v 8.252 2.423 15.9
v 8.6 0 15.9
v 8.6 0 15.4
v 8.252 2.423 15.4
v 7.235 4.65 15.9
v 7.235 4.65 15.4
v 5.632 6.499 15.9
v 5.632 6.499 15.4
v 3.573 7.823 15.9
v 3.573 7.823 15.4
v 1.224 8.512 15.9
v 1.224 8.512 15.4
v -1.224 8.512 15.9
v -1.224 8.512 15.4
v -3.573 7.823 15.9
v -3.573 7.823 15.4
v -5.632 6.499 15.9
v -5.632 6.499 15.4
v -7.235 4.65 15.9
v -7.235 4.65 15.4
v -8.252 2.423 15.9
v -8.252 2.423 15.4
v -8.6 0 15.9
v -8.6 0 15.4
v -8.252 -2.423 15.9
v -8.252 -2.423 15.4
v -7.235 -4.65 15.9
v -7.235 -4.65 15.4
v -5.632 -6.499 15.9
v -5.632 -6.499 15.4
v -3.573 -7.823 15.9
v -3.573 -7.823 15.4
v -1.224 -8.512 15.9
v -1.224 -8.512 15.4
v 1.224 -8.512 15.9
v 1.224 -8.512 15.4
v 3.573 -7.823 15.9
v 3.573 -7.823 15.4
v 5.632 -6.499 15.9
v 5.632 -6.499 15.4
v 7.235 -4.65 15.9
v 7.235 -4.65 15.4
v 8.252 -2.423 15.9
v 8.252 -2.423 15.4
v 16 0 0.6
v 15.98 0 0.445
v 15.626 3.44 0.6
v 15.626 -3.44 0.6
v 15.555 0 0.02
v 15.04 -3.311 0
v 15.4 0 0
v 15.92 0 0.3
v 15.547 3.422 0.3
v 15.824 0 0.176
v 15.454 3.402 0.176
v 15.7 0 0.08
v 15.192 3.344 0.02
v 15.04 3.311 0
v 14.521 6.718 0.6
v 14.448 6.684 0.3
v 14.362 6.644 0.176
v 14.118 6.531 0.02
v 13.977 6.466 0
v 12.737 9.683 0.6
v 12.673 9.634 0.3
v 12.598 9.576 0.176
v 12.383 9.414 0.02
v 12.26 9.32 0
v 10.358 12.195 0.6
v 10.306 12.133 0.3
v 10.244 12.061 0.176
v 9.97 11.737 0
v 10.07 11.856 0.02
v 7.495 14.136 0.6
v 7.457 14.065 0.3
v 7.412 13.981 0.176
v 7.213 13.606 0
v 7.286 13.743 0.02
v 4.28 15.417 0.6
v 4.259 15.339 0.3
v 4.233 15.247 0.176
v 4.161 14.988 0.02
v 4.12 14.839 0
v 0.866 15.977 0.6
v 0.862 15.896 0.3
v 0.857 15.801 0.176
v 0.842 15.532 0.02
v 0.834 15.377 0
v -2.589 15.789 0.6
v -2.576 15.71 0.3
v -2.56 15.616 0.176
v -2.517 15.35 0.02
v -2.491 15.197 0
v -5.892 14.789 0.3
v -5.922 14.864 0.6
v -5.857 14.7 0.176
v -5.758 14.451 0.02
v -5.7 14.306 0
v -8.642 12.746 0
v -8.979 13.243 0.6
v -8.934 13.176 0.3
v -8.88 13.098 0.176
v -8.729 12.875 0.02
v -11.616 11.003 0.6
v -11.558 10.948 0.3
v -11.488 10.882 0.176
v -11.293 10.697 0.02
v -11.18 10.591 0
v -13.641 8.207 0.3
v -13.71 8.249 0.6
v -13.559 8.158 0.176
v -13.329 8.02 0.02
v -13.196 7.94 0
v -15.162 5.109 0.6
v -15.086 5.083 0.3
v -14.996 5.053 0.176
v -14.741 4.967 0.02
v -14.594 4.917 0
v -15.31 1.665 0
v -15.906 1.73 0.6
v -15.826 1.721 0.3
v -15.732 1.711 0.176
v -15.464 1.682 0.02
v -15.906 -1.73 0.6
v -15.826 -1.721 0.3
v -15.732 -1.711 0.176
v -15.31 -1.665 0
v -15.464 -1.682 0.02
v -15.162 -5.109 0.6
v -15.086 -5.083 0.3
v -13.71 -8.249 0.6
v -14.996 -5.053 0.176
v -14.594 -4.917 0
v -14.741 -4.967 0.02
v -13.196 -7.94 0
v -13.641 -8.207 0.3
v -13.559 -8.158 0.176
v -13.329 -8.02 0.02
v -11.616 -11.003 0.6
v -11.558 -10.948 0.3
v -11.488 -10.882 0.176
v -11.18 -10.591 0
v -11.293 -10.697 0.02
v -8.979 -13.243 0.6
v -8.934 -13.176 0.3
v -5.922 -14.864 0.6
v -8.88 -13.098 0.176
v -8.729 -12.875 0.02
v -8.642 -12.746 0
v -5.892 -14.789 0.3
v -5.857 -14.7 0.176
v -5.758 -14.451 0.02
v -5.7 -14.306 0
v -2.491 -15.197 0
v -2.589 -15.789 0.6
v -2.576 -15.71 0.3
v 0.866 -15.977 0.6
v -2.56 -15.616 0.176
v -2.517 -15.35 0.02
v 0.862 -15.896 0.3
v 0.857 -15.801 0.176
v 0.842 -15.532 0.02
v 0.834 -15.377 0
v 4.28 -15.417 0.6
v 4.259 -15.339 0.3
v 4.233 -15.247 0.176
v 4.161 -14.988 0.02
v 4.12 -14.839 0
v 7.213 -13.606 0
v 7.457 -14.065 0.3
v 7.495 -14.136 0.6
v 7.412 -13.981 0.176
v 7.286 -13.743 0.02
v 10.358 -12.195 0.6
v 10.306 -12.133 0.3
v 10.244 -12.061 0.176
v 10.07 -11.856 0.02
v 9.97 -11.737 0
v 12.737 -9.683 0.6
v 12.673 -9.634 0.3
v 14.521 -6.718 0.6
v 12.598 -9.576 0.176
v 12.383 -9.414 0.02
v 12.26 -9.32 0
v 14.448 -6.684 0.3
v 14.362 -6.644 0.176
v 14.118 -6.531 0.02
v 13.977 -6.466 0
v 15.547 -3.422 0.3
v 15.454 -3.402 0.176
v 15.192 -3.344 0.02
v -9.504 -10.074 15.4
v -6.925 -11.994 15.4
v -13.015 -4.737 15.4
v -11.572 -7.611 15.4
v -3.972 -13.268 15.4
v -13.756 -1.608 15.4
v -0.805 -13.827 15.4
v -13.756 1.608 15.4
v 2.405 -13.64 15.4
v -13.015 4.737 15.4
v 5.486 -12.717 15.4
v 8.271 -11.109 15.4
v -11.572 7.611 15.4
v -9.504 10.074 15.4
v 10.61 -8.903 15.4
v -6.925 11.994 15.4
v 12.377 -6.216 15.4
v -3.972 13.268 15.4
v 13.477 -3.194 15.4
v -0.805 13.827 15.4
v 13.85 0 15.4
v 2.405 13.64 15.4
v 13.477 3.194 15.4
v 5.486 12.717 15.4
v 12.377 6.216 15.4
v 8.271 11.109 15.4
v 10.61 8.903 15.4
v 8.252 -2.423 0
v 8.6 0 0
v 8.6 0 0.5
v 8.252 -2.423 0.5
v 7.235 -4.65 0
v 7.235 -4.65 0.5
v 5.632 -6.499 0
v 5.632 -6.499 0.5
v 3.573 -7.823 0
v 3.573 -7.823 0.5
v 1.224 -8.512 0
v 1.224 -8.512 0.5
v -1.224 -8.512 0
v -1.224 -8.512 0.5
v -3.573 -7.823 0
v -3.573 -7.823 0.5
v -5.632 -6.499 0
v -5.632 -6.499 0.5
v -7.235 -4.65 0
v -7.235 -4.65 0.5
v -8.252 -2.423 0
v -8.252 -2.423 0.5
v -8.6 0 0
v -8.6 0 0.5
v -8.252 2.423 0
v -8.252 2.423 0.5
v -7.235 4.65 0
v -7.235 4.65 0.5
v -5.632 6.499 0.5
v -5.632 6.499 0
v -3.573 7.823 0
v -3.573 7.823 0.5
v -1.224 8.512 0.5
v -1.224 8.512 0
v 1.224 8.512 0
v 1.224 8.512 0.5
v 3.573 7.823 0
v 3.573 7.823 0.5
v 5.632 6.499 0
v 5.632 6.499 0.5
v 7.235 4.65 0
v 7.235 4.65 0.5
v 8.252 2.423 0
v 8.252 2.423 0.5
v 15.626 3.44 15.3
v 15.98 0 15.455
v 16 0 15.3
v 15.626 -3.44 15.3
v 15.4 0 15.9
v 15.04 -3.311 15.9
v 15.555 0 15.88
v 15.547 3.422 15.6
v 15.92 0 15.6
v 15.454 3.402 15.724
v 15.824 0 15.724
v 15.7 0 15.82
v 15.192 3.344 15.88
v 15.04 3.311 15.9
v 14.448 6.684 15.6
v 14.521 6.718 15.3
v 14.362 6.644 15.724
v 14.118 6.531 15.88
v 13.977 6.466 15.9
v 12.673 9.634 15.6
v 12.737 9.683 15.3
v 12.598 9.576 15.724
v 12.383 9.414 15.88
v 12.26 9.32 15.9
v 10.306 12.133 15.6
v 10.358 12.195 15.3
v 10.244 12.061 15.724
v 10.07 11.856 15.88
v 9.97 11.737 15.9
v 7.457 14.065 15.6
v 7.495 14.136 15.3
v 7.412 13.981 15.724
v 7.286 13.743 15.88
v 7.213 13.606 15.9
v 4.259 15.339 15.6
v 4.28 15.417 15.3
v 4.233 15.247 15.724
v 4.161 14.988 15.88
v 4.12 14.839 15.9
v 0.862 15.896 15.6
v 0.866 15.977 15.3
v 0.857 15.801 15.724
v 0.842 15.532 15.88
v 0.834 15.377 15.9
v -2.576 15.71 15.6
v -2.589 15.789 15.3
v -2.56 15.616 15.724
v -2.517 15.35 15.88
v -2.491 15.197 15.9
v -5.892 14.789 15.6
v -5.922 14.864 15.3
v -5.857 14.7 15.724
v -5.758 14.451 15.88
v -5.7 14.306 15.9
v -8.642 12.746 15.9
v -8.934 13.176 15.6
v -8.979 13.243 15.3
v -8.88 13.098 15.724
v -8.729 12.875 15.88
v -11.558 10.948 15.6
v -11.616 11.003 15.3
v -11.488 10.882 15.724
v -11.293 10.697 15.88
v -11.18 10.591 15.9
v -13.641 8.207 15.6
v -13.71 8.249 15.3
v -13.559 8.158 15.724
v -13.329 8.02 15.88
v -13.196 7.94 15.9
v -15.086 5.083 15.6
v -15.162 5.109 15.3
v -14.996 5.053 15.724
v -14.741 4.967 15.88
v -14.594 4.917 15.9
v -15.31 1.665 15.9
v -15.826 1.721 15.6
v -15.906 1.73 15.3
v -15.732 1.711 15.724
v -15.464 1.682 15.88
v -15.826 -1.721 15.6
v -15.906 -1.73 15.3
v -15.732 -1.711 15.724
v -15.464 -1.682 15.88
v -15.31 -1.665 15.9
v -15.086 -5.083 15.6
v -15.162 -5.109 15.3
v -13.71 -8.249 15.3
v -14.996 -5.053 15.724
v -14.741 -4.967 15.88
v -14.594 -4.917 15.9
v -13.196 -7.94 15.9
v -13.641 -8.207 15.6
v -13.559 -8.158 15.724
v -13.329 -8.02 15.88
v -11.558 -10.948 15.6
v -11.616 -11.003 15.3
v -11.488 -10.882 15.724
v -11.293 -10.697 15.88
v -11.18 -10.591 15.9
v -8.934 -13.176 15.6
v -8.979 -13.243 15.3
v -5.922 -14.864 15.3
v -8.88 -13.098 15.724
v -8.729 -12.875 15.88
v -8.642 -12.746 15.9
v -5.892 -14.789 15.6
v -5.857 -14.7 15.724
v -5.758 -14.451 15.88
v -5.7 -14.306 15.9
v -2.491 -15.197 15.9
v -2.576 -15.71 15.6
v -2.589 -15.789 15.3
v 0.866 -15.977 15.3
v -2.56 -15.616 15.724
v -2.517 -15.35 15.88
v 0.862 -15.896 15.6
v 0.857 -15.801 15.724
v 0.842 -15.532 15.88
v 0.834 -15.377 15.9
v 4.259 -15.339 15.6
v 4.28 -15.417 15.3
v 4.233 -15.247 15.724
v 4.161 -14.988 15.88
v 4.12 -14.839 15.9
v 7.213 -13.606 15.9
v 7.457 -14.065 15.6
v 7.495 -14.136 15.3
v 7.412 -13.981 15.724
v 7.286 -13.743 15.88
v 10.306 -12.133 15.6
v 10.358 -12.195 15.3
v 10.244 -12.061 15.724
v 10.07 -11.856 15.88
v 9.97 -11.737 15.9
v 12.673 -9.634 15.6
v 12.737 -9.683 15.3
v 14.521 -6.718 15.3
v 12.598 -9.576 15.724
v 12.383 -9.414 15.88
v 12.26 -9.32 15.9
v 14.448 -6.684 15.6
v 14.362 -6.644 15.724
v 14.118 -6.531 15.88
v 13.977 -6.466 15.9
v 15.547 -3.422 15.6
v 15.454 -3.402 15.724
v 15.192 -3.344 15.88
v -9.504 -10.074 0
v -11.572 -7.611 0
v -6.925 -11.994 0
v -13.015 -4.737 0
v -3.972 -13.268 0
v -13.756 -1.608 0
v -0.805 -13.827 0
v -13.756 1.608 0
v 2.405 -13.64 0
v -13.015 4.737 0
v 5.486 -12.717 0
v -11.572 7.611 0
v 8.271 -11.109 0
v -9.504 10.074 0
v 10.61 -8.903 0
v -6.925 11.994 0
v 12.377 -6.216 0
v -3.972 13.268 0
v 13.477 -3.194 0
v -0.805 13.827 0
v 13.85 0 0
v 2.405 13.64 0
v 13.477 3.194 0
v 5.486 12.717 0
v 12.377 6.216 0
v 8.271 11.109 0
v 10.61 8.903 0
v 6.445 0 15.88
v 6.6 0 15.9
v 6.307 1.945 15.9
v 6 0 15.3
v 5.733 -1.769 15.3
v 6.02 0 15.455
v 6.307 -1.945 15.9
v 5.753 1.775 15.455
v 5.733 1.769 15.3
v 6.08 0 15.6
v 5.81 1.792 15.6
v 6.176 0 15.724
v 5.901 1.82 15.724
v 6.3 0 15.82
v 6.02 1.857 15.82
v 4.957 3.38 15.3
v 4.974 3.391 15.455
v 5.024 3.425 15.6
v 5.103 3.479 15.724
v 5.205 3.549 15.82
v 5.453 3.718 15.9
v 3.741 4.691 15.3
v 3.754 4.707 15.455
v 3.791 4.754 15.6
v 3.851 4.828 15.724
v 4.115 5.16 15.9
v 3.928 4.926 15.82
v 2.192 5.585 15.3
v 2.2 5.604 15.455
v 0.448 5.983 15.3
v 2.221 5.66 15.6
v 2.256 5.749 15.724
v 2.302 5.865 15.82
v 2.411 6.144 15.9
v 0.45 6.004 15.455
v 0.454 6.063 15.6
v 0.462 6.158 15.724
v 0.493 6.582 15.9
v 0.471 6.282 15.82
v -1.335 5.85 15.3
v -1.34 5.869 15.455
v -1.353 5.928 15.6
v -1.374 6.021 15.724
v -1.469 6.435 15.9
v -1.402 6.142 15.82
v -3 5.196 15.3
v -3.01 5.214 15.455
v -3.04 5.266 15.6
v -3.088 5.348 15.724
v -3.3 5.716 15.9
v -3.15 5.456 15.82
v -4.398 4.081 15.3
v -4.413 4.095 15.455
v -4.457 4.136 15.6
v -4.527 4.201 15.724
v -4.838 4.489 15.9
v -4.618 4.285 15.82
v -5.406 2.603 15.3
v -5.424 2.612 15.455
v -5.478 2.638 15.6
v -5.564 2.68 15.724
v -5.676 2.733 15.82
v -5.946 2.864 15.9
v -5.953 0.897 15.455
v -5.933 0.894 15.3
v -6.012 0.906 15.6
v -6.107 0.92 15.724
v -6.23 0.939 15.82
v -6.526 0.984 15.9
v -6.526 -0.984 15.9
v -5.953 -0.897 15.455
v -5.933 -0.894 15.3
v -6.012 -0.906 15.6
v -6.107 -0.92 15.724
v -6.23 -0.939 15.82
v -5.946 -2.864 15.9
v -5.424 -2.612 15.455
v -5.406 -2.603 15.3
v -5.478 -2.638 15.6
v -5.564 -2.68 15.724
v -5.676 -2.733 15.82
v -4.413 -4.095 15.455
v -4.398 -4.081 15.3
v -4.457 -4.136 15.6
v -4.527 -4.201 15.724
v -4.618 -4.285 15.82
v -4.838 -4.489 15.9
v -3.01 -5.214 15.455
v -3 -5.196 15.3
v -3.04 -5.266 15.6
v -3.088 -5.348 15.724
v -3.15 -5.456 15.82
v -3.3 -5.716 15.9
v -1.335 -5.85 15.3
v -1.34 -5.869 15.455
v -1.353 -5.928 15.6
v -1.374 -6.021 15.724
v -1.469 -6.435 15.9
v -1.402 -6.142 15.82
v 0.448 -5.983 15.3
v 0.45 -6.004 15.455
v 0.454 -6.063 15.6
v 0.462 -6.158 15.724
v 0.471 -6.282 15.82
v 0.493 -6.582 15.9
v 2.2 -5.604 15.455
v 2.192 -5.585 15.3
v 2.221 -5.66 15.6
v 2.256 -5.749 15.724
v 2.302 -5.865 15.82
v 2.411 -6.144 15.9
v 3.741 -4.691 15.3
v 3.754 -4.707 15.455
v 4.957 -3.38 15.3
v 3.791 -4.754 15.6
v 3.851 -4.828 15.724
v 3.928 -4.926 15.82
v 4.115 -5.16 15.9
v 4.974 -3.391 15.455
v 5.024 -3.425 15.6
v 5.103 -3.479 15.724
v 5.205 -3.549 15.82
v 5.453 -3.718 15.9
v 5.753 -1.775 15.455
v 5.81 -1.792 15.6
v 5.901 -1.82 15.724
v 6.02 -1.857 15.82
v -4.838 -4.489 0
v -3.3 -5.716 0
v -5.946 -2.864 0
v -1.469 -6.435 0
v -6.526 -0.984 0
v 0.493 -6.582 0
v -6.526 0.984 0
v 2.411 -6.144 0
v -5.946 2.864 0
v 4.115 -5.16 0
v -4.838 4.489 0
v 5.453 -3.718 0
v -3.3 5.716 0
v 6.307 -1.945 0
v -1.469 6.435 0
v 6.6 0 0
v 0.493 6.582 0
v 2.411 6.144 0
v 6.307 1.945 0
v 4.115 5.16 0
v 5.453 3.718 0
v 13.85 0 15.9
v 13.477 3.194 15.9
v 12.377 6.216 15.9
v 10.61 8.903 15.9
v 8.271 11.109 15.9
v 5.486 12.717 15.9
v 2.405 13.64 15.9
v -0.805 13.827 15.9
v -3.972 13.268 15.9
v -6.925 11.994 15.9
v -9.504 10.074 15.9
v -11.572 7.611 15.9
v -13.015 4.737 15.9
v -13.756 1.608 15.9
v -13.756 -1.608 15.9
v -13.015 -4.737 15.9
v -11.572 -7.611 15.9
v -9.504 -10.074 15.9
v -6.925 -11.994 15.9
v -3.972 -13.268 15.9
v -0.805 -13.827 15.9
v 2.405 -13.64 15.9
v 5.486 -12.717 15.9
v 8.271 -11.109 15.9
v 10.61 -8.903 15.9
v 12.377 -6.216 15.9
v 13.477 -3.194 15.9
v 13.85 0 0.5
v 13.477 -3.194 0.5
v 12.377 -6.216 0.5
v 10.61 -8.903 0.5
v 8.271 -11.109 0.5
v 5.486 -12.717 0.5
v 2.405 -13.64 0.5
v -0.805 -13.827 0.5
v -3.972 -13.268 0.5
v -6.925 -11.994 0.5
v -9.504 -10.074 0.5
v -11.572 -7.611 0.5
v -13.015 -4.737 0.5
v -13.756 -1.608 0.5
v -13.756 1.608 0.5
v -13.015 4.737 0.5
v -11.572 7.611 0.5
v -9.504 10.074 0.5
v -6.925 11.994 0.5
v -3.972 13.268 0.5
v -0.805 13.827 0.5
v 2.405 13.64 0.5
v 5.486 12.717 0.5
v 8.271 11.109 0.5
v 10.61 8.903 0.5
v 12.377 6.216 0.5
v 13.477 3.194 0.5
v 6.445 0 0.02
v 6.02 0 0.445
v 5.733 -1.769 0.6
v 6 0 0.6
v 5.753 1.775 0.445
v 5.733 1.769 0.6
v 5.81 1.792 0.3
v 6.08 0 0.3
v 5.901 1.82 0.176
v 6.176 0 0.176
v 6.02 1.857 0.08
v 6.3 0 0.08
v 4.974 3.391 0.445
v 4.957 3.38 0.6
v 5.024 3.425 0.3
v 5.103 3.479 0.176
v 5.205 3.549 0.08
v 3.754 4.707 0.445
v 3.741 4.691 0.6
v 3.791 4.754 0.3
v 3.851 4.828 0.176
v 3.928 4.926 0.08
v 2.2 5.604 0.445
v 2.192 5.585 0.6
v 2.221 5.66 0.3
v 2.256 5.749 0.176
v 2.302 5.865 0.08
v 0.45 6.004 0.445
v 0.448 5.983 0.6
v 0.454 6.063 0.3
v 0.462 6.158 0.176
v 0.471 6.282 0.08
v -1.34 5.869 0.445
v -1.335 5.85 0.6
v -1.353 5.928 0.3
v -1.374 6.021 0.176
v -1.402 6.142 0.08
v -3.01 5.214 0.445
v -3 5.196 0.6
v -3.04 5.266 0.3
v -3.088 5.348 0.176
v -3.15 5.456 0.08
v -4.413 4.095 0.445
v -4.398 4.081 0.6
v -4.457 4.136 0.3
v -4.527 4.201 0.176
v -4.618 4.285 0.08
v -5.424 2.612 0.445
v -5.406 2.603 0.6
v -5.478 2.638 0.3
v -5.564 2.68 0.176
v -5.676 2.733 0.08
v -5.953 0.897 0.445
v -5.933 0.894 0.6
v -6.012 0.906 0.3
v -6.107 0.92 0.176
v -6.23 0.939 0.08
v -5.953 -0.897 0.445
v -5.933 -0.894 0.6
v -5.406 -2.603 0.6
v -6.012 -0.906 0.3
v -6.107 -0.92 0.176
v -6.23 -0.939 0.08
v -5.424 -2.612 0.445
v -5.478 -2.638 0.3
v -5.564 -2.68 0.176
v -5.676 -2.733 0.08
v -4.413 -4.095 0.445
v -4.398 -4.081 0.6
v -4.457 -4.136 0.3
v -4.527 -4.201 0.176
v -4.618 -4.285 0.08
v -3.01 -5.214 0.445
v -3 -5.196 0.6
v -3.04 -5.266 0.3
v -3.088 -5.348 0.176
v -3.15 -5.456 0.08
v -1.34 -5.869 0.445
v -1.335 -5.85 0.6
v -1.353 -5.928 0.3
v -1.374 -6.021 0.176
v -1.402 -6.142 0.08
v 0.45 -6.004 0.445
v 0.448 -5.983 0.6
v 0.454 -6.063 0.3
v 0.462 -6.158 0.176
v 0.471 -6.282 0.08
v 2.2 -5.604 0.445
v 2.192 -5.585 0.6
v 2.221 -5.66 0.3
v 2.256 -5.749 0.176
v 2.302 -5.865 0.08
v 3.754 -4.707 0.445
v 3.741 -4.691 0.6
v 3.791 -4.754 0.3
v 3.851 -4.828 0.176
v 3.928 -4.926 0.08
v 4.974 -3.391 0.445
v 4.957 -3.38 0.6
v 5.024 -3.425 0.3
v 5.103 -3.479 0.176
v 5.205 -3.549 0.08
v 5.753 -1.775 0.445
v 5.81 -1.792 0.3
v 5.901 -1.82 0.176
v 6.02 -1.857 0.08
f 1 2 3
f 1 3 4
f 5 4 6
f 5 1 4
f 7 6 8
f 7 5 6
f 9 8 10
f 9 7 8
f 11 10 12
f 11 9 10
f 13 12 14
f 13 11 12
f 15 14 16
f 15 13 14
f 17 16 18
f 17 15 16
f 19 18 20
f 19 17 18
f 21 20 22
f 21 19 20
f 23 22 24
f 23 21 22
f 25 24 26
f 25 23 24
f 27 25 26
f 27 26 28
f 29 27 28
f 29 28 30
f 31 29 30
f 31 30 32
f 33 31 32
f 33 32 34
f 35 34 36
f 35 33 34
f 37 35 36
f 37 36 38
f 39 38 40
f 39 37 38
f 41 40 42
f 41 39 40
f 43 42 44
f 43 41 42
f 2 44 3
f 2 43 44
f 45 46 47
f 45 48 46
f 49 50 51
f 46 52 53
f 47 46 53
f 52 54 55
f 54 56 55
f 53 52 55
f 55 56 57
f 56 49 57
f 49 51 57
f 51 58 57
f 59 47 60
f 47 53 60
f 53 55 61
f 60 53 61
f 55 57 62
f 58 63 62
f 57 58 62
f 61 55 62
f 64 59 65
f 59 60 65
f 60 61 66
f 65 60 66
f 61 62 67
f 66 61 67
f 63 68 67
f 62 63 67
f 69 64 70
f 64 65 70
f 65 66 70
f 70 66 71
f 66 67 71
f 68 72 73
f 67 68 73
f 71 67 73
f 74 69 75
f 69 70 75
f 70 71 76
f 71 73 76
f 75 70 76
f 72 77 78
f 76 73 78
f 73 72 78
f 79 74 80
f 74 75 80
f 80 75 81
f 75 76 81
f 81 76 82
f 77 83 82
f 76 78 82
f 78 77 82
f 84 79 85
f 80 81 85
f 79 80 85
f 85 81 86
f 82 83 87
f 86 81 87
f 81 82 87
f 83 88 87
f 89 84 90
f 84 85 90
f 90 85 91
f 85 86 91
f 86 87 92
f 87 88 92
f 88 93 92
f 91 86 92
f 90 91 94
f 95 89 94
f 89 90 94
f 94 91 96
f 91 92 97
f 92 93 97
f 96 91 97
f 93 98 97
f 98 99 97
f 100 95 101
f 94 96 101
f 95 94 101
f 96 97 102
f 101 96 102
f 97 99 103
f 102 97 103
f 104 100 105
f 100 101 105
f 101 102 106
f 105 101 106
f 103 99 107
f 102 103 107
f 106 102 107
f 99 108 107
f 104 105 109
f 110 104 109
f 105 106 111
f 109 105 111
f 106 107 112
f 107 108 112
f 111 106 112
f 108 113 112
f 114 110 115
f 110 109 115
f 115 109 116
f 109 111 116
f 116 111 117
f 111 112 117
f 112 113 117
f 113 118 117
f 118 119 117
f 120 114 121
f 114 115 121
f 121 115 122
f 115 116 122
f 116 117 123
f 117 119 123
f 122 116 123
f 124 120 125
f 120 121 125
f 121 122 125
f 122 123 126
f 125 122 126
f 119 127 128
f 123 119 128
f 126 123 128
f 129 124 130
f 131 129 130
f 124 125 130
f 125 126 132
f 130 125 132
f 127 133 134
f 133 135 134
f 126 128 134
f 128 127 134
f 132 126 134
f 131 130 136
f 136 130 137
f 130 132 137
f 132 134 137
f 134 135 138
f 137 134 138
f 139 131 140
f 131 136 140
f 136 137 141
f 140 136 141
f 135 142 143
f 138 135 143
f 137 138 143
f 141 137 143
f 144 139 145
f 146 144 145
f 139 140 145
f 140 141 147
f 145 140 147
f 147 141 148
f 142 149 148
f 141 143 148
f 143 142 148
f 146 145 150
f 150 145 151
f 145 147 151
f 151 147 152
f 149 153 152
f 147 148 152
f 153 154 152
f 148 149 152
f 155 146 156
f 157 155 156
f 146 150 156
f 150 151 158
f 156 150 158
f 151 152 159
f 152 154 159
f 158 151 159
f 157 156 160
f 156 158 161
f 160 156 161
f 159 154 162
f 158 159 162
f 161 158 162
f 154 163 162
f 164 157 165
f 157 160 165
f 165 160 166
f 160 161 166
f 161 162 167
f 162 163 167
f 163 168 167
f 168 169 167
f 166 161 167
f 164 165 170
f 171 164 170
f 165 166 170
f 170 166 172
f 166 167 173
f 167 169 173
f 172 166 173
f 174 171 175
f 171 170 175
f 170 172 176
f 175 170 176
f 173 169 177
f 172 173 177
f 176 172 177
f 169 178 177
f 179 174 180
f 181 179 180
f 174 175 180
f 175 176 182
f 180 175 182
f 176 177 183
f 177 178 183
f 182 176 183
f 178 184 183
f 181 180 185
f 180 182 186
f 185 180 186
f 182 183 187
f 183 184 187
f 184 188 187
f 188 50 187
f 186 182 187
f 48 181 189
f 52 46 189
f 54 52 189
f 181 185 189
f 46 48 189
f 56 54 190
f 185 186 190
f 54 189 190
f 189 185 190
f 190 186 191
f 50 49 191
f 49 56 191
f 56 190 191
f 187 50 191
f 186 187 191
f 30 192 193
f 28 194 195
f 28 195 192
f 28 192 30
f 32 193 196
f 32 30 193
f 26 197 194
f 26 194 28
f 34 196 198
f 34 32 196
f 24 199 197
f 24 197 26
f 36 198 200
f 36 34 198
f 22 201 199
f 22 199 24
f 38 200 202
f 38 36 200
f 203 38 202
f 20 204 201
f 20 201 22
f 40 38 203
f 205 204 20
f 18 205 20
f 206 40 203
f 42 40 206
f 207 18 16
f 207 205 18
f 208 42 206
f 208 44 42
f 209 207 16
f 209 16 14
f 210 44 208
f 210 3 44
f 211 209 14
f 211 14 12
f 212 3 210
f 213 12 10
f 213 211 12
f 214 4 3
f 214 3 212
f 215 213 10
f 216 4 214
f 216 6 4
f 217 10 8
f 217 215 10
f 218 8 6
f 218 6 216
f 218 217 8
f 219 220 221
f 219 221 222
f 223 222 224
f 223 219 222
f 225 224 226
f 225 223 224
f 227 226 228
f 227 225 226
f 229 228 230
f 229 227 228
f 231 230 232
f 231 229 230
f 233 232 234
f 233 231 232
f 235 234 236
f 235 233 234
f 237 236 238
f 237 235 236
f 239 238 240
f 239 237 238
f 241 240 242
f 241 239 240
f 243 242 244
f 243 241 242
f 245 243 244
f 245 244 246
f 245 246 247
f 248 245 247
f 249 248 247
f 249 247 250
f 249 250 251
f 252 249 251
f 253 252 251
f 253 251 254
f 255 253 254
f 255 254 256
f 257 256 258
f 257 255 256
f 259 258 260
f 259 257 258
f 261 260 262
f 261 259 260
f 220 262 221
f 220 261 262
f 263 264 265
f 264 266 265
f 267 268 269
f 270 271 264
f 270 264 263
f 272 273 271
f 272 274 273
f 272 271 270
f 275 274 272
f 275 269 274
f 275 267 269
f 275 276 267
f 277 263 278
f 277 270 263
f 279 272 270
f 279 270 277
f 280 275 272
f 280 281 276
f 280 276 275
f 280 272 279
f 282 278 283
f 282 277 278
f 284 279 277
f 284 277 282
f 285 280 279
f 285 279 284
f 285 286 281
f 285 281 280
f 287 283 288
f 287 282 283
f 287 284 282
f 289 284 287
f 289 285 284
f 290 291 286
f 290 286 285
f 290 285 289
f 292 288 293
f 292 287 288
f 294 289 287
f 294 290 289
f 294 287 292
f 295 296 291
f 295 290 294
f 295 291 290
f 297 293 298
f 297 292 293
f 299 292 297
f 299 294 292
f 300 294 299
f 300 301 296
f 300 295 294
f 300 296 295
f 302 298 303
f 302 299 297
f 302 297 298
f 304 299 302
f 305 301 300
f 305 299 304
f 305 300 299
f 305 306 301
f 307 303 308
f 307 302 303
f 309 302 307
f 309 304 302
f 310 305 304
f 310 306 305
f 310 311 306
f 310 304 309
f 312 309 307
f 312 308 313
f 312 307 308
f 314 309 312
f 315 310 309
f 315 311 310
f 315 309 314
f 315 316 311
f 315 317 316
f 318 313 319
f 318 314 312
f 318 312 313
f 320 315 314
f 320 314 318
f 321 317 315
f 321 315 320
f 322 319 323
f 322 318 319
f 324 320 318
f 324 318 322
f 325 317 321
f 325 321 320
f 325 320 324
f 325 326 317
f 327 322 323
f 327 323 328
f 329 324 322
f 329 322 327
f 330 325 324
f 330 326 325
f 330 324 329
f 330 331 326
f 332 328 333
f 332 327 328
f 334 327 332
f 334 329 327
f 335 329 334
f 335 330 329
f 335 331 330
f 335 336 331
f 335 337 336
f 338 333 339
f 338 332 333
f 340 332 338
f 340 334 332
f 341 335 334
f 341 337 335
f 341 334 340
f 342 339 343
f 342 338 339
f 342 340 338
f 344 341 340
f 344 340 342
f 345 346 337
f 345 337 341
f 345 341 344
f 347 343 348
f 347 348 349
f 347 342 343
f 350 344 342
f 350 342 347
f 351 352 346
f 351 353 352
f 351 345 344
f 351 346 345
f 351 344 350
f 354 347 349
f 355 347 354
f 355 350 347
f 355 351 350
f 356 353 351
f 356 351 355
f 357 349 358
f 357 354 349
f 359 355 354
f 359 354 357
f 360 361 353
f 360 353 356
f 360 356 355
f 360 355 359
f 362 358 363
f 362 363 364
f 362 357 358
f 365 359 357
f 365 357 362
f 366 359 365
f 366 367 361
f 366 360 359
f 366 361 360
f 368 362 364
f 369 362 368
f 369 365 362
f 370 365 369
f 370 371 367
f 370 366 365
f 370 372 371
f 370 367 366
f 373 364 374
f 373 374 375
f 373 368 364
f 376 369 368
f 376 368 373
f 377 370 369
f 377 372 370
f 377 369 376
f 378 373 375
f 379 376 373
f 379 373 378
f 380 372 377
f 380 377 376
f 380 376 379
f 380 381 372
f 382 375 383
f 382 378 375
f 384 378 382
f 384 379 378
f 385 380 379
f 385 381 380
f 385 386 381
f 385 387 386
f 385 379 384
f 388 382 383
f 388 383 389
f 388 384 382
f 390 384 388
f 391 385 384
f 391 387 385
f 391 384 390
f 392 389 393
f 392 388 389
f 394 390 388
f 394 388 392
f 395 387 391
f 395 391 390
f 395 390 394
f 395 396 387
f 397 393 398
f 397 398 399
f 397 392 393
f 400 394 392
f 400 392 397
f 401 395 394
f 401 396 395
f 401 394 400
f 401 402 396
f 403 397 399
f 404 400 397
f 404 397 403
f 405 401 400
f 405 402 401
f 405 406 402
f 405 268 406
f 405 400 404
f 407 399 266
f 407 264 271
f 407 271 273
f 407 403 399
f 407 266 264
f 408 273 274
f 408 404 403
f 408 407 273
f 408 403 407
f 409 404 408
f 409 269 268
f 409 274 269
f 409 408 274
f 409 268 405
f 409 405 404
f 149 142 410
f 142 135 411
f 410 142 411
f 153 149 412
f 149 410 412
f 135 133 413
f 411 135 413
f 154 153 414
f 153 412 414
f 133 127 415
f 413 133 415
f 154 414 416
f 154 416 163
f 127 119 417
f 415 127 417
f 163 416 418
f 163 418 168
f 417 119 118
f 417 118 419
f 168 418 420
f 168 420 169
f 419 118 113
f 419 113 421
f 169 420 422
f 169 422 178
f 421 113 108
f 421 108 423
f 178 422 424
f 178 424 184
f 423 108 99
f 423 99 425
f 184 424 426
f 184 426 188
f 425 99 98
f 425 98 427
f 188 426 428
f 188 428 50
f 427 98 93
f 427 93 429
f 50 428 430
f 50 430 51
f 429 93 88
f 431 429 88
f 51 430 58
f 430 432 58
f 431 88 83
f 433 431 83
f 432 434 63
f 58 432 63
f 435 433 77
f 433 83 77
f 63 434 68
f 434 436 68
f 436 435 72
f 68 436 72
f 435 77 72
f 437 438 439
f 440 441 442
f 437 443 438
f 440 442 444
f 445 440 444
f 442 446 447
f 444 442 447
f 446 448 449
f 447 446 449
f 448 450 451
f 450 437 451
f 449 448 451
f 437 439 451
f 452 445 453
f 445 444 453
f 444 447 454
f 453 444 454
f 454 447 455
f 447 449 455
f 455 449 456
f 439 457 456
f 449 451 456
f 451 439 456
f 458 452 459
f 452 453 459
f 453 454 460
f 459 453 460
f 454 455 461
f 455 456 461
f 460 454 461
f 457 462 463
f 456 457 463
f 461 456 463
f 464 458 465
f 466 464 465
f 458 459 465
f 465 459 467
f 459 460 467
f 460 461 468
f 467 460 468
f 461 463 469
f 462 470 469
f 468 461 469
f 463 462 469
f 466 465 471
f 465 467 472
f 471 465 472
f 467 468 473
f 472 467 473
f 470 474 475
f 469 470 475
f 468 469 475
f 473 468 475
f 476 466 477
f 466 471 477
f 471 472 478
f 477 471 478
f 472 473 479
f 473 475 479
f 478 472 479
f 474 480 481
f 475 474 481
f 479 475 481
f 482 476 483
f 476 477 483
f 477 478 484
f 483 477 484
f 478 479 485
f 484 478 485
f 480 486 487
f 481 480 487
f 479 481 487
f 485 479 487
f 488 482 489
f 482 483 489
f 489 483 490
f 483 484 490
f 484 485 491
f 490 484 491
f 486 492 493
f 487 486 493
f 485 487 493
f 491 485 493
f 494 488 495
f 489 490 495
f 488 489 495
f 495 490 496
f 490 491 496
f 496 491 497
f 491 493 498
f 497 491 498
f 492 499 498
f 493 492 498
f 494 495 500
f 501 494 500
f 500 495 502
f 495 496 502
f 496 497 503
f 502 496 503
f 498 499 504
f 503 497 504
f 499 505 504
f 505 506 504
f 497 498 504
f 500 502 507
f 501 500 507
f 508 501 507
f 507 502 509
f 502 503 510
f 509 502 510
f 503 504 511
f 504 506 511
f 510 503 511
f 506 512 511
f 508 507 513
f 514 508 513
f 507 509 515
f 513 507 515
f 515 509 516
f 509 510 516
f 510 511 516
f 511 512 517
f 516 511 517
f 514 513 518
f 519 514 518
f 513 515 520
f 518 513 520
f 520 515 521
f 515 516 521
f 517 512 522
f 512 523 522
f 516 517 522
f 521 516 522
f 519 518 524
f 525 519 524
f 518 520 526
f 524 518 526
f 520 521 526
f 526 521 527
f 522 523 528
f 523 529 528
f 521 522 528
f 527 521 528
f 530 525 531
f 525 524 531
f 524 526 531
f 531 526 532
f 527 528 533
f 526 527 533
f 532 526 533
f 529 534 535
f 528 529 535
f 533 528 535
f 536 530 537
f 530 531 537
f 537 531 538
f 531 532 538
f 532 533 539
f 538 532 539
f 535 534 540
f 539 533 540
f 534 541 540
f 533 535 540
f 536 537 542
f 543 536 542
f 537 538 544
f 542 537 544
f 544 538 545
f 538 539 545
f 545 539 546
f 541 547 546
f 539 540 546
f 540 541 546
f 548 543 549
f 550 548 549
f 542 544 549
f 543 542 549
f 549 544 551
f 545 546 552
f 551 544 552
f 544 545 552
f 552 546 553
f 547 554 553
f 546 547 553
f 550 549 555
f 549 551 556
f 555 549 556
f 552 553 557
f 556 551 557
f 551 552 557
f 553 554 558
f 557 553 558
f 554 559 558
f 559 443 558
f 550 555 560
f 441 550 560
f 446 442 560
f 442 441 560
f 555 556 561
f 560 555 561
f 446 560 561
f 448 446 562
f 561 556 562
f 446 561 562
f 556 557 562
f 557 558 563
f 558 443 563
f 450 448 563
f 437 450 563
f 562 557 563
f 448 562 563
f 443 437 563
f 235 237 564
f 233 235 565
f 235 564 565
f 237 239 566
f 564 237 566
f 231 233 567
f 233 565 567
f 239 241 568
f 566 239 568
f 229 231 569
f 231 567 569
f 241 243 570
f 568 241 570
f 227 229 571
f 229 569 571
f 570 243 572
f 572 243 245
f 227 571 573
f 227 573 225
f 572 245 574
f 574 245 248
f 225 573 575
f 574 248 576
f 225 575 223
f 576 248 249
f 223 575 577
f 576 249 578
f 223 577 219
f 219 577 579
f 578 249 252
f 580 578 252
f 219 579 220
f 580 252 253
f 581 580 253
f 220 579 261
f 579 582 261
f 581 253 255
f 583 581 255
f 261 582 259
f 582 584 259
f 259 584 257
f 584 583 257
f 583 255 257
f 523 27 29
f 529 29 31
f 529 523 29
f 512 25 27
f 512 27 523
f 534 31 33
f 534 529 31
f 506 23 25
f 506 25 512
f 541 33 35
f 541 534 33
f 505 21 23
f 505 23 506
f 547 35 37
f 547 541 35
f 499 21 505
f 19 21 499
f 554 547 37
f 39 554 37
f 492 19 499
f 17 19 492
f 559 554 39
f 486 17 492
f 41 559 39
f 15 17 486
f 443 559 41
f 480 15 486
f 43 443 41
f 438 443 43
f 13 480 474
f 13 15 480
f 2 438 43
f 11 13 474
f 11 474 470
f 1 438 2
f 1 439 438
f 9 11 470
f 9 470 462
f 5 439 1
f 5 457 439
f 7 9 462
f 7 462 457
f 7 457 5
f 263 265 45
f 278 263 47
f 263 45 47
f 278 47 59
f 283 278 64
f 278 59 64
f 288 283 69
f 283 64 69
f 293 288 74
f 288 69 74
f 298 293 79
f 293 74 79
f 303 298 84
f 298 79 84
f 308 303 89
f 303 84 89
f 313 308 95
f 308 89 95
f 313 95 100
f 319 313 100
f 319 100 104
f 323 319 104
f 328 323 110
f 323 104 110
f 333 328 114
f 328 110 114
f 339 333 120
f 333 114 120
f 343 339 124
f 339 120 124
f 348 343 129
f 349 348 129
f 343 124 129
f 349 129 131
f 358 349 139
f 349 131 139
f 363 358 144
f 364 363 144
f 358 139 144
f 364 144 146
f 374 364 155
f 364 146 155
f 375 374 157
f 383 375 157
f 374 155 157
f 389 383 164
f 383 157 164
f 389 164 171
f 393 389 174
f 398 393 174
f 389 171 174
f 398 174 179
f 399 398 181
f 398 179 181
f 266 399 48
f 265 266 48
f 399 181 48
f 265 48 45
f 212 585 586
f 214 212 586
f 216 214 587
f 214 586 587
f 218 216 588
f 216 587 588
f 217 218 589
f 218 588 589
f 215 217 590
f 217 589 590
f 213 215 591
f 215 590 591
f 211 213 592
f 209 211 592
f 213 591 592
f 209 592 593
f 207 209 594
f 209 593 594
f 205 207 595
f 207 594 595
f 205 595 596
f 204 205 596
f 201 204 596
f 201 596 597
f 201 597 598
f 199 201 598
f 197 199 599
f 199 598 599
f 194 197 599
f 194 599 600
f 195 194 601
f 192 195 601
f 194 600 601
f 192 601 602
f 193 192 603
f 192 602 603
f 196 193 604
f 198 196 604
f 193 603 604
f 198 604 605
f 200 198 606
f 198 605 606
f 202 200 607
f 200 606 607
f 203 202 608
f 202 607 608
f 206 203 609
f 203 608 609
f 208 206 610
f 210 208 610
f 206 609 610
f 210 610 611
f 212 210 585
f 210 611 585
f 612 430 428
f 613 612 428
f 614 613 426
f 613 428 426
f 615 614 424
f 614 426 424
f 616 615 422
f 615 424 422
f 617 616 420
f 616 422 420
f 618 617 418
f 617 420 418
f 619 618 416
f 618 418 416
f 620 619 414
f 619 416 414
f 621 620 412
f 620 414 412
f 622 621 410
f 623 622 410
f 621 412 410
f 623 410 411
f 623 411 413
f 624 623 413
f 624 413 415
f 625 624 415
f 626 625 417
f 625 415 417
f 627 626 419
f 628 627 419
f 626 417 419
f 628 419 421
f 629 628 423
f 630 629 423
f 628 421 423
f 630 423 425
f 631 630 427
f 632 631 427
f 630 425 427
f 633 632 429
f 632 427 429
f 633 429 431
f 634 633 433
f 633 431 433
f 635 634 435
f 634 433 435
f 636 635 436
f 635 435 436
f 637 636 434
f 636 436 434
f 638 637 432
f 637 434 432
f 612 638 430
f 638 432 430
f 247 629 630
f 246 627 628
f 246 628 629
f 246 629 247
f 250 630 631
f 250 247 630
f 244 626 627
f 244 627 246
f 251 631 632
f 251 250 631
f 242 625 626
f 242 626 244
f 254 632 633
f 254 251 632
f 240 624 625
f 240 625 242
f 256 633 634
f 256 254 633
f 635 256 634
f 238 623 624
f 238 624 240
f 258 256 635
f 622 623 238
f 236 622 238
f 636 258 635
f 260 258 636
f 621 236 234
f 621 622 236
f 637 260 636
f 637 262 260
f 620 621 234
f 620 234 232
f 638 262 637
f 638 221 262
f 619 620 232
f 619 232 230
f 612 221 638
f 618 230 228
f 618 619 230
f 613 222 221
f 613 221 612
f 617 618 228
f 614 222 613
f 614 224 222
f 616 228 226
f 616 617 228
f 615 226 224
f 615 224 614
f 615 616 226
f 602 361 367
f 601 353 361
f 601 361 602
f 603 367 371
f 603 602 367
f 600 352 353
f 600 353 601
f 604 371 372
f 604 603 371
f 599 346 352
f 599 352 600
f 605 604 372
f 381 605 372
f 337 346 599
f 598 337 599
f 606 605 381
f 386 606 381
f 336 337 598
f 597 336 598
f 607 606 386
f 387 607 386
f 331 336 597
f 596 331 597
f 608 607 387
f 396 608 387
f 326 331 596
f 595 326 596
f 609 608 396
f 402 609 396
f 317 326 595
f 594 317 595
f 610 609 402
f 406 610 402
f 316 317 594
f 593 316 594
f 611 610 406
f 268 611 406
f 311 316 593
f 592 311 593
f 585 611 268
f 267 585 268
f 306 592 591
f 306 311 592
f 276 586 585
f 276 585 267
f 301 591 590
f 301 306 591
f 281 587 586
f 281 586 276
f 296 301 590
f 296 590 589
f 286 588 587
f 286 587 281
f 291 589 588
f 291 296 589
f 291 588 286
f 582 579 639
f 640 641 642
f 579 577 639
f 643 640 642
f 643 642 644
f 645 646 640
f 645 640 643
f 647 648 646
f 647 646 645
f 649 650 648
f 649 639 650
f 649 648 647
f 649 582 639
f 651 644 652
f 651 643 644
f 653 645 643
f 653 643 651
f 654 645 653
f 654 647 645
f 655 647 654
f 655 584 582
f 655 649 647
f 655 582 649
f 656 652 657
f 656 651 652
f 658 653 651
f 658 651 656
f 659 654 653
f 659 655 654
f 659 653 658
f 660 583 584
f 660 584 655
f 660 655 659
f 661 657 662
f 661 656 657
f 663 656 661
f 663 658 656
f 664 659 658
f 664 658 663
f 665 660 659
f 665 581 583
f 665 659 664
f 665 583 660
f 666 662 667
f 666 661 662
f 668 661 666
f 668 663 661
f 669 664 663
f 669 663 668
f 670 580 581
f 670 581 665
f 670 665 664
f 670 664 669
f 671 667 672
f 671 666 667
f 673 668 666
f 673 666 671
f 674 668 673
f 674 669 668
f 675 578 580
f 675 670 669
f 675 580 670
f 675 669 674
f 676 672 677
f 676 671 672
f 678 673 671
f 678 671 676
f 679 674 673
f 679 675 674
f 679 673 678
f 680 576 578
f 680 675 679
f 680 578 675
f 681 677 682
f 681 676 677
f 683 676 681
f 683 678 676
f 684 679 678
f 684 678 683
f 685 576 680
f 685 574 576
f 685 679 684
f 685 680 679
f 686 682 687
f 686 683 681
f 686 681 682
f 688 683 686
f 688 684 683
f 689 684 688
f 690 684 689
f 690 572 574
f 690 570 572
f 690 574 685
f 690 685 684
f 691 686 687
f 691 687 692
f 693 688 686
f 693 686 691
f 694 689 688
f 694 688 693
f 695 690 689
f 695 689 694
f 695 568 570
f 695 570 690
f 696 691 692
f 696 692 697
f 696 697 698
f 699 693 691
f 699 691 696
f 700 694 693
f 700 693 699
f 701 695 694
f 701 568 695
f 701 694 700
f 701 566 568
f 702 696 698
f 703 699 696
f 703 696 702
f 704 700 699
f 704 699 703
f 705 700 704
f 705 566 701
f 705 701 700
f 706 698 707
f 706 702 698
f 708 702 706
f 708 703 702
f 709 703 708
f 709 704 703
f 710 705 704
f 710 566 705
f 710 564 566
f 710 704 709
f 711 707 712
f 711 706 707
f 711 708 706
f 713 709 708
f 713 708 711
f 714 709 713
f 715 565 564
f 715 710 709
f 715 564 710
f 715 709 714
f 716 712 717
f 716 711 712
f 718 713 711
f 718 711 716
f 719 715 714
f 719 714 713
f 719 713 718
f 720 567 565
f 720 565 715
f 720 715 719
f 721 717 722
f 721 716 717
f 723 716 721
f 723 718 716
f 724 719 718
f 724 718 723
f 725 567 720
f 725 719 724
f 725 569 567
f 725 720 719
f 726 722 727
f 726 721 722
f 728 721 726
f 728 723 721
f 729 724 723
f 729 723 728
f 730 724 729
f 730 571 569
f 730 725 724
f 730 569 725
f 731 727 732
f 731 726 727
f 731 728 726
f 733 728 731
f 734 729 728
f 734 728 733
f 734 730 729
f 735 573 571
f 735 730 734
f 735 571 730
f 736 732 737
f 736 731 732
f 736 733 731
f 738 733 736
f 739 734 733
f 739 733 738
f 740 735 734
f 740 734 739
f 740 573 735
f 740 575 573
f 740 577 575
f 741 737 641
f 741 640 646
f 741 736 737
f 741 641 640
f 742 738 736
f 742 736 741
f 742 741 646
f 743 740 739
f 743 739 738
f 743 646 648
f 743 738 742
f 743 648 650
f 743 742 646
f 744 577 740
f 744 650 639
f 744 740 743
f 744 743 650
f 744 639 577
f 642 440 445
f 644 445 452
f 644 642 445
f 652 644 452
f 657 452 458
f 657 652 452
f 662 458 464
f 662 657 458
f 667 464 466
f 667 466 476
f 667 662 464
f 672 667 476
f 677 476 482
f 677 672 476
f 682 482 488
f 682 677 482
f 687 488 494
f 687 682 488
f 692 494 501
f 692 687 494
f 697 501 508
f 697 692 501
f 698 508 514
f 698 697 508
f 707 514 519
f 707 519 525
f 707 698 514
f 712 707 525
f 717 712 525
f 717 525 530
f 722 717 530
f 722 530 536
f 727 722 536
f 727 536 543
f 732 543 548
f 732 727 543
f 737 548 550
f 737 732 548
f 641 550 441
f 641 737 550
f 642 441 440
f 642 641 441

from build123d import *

# Parameters (mm, degrees)
F0_R     = 16
F0_R_2   = 6
F1_DEPTH = 15.9
F2_R     = 0.6
F3_R     = 13.85
F3_R_2   = 8.6
F4_DEPTH = 0.5
F5_R     = 13.85
F5_R_2   = 8.6
F6_DEPTH = 0.5


with BuildPart() as f1:
    # F0 (on Top) → F1 (new body)
    with BuildSketch(Plane.XY):
        Circle(F0_R)
        Circle(F0_R_2, mode=Mode.SUBTRACT)
    extrude(amount=F1_DEPTH)

    # F2
    f2_edges = [f1.edges().sort_by_distance(p)[0] for p in [
        (6, 0, 7.95),
        (-6, 0, 0),
        (-6, 0, 15.9),
        (16, 0, 7.95),
        (-16, 0, 0),
        (-16, 0, 15.9),
    ]]
    fillet(f2_edges, radius=F2_R)

    # F3 (on face) → F4 (cut)
    with BuildSketch(Plane.XY.offset(15.9)):
        Circle(F3_R)
        Circle(F3_R_2, mode=Mode.SUBTRACT)
    extrude(amount=-F4_DEPTH, mode=Mode.SUBTRACT)

    # F5 (on face) → F6 (cut)
    with BuildSketch(Plane(origin=(0, 0, 0), x_dir=(1, 0, 0), z_dir=(0, 0, -1))):
        Circle(F5_R)
        Circle(F5_R_2, mode=Mode.SUBTRACT)
    extrude(amount=-F6_DEPTH, mode=Mode.SUBTRACT)


solid = f1.part
